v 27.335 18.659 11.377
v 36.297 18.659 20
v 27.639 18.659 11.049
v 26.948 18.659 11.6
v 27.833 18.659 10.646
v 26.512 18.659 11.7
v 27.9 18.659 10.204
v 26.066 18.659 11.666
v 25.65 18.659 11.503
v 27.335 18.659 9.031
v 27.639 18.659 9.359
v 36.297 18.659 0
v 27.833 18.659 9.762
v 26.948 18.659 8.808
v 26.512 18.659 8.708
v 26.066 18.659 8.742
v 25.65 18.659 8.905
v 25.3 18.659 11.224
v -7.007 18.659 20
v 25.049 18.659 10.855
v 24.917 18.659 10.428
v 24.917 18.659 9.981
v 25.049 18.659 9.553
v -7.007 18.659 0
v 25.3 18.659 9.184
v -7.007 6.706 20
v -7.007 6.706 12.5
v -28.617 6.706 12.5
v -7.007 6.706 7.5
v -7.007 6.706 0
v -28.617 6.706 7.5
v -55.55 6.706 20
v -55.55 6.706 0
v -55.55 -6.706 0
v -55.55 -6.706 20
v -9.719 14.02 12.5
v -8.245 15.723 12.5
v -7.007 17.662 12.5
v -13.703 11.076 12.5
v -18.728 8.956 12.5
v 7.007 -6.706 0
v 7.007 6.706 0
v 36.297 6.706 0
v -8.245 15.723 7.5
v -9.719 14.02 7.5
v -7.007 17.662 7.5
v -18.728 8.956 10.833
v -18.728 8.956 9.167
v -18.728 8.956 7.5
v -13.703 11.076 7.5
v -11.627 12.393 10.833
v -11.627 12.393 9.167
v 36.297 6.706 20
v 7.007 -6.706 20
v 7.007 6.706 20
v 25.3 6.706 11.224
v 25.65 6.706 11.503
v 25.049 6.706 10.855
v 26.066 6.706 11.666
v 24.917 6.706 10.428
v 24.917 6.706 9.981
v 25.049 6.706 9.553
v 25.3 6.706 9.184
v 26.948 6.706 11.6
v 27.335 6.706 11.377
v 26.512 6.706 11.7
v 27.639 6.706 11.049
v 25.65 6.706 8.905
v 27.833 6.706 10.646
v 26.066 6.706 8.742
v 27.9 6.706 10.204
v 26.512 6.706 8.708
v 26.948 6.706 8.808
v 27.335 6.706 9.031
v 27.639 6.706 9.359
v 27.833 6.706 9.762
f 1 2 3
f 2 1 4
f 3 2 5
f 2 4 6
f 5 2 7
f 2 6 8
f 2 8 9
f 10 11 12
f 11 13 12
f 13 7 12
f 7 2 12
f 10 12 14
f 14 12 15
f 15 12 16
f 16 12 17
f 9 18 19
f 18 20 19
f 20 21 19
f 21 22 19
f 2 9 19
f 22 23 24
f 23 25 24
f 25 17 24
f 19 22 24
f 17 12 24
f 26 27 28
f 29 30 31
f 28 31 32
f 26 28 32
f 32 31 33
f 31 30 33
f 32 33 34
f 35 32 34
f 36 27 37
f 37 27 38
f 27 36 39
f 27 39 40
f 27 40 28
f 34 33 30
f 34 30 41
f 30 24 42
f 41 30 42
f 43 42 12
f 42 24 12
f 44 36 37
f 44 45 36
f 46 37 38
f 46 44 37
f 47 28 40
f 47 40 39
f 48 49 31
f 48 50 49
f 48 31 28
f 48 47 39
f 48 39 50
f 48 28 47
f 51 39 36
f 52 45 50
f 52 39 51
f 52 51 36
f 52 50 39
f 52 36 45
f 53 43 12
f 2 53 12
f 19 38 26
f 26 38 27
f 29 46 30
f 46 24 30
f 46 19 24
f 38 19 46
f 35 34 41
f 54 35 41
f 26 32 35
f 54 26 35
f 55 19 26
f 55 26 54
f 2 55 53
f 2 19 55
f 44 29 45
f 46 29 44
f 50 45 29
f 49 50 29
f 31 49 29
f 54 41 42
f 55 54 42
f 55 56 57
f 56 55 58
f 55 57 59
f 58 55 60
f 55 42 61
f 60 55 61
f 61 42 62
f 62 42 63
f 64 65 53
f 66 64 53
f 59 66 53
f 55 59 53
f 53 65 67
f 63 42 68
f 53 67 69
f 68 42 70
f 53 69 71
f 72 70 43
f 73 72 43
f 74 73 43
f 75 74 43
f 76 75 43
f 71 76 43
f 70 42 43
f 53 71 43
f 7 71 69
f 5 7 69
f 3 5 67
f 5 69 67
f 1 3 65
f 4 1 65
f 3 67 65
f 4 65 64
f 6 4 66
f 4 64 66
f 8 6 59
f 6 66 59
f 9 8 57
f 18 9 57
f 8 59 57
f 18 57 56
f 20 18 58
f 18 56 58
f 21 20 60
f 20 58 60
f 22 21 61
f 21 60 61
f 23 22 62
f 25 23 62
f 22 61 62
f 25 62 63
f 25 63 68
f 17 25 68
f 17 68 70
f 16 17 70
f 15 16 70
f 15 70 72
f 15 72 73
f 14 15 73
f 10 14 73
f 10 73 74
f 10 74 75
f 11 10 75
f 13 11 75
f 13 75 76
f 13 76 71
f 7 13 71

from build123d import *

# Parameters (mm, degrees)
PAD_DEPTH    = 20
SKETCH001_R  = 1.5
POCKET_DEPTH = 35
PAD001_DEPTH = 5


with BuildPart() as part:
    # Sketch → Pad (new body)
    with BuildSketch(Plane.XY):
        Polygon((-55.54966, 6.705533), (-55.54966, -6.705533), (7.007378, -6.705533), (7.007378, 6.705533), (36.297374, 6.705533), (36.297374, 18.658901), (-7.007378, 18.658901), (-7.007378, 6.705533), align=None)
    extrude(amount=PAD_DEPTH)

    # Sketch001 → Pocket (cut)
    with BuildSketch(Plane.XZ):
        with Locations((26.4, 10.204084)):
            Circle(SKETCH001_R)
    extrude(amount=-POCKET_DEPTH, mode=Mode.SUBTRACT)

    # Sketch002 → Pad001 (join)
    with BuildSketch(Plane.XY.offset(7.5)):
        with BuildLine():
            add(Edge.make_bspline(
                [(-30.4665, 6.414), (-17.93, 8.30904), (-10.6414, 10.933), (-6.9843, 17.705013)],
                knots=[0, 0, 0, 0, 1, 1, 1, 1], degree=3))
            Line((-6.9843, 17.705013), (-3.352778, 3.207006))
            Line((-3.352778, 3.207006), (-29.883389, 3.207006))
            Line((-29.883389, 3.207006), (-30.4665, 6.414))
        make_face()
    extrude(amount=PAD001_DEPTH)


solid = part.part
